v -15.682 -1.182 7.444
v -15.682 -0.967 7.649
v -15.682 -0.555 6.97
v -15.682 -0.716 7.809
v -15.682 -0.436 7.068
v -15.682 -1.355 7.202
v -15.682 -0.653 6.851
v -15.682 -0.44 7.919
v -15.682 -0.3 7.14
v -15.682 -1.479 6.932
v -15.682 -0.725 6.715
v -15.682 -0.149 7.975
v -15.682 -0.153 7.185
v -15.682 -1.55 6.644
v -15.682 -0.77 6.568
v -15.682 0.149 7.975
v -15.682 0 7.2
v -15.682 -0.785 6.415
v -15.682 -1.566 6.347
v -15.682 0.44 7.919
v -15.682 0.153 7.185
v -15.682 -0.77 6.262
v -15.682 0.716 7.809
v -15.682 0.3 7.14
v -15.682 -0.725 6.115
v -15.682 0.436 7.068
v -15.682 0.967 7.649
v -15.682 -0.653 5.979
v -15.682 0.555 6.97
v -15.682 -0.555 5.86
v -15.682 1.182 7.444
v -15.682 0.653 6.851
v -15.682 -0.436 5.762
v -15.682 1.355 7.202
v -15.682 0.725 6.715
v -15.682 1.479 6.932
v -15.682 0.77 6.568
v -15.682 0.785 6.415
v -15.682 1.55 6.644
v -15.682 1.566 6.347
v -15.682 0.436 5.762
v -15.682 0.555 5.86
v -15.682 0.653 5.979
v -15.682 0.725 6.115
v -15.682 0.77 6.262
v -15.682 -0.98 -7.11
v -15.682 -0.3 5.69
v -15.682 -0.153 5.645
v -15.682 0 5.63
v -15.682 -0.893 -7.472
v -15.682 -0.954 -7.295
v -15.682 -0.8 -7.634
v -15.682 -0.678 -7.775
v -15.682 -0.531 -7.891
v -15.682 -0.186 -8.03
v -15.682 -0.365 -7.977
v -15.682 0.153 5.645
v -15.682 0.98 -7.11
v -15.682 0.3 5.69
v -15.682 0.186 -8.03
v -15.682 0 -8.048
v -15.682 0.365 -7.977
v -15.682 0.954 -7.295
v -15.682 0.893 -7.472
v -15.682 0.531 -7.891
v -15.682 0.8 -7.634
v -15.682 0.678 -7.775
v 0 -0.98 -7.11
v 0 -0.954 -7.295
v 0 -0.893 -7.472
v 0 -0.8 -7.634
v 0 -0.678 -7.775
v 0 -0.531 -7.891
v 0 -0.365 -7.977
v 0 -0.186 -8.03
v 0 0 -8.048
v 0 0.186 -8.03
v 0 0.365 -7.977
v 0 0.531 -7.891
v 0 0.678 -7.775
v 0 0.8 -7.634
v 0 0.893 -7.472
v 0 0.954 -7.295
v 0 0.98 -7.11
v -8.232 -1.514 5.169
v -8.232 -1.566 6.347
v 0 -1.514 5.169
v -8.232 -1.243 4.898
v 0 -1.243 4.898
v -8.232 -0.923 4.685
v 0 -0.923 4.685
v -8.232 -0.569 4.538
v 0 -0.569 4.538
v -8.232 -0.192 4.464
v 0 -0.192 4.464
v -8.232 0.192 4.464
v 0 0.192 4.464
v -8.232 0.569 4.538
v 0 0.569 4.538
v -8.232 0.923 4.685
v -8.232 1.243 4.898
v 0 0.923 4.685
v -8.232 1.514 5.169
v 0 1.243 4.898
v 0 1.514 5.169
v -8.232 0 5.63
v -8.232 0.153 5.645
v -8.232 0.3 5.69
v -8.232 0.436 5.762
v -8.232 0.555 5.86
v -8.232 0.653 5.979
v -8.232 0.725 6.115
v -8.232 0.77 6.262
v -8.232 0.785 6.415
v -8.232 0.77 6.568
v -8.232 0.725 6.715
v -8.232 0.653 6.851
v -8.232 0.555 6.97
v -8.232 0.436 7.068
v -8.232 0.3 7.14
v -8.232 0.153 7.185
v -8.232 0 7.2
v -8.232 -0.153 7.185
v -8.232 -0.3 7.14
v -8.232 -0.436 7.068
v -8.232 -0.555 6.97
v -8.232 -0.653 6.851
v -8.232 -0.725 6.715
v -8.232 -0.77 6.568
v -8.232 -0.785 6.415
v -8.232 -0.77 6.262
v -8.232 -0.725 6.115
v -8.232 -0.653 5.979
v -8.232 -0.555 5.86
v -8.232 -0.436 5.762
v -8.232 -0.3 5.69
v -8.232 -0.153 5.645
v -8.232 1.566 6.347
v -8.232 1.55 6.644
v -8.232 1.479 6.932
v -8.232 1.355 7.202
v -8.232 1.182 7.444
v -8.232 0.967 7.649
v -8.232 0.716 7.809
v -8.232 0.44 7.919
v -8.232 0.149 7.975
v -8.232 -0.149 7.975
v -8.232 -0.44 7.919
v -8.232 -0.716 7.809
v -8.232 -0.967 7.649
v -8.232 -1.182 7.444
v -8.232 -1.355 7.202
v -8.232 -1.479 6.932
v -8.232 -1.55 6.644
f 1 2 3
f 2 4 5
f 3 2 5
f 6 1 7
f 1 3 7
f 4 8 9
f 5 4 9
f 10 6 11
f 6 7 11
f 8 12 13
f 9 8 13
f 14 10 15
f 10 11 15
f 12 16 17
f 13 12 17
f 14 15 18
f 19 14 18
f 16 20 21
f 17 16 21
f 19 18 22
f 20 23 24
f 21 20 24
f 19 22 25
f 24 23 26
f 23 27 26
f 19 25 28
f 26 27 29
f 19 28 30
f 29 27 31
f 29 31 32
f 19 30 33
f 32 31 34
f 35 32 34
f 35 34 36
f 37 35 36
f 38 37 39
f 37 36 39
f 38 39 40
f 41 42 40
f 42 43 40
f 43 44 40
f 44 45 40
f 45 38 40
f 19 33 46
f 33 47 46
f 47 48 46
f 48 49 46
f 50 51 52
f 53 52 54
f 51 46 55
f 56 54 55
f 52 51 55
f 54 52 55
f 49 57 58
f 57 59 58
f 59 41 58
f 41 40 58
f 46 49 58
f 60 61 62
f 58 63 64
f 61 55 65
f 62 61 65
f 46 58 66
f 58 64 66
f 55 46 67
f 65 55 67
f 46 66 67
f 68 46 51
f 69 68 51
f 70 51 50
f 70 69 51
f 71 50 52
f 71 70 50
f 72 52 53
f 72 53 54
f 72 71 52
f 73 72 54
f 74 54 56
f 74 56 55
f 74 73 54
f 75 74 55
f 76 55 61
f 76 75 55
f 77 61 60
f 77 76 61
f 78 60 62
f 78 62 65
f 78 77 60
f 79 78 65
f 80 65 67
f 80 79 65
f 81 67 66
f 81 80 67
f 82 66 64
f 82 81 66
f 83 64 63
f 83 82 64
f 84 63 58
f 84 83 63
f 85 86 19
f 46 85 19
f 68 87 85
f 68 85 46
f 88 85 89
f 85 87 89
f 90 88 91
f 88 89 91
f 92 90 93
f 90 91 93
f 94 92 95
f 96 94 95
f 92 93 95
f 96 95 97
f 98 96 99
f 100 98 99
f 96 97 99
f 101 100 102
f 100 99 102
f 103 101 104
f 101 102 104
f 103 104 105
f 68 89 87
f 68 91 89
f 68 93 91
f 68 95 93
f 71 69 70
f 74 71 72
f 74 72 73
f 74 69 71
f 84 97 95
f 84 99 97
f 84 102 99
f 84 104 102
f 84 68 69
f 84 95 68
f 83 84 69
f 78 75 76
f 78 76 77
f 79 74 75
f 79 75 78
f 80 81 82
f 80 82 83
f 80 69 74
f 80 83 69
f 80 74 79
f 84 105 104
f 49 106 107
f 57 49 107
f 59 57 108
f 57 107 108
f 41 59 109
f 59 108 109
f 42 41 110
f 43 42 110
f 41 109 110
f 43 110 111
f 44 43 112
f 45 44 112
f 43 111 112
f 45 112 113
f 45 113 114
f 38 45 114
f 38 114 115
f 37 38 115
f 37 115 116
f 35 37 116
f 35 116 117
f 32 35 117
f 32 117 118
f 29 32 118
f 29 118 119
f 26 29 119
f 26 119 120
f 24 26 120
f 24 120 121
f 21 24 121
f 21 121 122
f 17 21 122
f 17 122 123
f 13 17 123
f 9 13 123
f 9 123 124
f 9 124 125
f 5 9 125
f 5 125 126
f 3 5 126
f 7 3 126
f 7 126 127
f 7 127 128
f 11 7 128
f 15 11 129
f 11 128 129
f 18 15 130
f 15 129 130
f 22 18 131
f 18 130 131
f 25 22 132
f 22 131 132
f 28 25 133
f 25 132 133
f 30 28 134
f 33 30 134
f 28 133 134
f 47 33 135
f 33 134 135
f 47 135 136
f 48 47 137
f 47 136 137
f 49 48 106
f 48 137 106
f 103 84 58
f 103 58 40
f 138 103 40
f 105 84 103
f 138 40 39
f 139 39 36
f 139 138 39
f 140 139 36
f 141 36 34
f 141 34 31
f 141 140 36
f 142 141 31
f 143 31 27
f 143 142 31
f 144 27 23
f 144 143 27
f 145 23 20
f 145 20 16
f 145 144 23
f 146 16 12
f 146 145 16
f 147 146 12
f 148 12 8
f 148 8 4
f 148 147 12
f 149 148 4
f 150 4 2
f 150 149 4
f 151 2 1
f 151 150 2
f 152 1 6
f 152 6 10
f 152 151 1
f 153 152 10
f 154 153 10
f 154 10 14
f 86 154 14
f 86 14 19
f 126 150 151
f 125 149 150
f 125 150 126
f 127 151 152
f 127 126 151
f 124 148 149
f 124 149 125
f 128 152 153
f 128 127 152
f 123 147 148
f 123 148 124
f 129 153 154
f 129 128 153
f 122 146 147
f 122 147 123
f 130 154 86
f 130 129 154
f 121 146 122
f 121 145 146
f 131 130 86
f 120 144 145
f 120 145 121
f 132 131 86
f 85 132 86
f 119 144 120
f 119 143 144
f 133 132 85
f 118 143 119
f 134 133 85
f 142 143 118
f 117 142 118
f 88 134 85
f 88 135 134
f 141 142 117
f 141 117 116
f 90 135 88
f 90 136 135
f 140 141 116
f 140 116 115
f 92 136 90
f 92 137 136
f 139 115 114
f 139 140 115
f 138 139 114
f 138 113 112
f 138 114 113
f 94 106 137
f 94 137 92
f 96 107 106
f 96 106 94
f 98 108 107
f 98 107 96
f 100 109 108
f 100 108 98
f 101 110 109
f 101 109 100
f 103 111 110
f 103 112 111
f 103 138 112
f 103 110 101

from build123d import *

# Parameters (mm, degrees)
SKETCH1_R           = 0.78486
BOSS_EXTRUDE1_DEPTH = 15.68196
SKETCH2_R           = 1.96088
CUT_EXTRUDE1_DEPTH  = 8.23214


with BuildPart() as part:
    # Sketch1 → Boss-Extrude1 (new body)
    with BuildSketch(Plane(origin=(0, 0, 0), x_dir=(0, 0, -1), z_dir=(1, 0, 0))):
        with BuildLine():
            Line((-6.346883091, -1.565695238), (7.109902444, -0.979511121))
            ThreePointArc((7.109902444, -0.979511121), (8.047674463, 0), (7.109902444, 0.979511121))
            Line((7.109902444, 0.979511121), (-6.346883091, 1.565695238))
            ThreePointArc((-6.346883091, 1.565695238), (-7.982265537, 0), (-6.346883091, -1.565695238))
        make_face()
        with Locations((-6.415085537, 0)):
            Circle(SKETCH1_R, mode=Mode.SUBTRACT)
    extrude(amount=-BOSS_EXTRUDE1_DEPTH)

    # Sketch2 → Cut-Extrude1 (cut)
    with BuildSketch(Plane(origin=(0, 0, 0), x_dir=(0, 0, -1), z_dir=(1, 0, 0))):
        with Locations((-6.415085537, 0)):
            Circle(SKETCH2_R)
    extrude(amount=-CUT_EXTRUDE1_DEPTH, mode=Mode.SUBTRACT)


solid = part.part
